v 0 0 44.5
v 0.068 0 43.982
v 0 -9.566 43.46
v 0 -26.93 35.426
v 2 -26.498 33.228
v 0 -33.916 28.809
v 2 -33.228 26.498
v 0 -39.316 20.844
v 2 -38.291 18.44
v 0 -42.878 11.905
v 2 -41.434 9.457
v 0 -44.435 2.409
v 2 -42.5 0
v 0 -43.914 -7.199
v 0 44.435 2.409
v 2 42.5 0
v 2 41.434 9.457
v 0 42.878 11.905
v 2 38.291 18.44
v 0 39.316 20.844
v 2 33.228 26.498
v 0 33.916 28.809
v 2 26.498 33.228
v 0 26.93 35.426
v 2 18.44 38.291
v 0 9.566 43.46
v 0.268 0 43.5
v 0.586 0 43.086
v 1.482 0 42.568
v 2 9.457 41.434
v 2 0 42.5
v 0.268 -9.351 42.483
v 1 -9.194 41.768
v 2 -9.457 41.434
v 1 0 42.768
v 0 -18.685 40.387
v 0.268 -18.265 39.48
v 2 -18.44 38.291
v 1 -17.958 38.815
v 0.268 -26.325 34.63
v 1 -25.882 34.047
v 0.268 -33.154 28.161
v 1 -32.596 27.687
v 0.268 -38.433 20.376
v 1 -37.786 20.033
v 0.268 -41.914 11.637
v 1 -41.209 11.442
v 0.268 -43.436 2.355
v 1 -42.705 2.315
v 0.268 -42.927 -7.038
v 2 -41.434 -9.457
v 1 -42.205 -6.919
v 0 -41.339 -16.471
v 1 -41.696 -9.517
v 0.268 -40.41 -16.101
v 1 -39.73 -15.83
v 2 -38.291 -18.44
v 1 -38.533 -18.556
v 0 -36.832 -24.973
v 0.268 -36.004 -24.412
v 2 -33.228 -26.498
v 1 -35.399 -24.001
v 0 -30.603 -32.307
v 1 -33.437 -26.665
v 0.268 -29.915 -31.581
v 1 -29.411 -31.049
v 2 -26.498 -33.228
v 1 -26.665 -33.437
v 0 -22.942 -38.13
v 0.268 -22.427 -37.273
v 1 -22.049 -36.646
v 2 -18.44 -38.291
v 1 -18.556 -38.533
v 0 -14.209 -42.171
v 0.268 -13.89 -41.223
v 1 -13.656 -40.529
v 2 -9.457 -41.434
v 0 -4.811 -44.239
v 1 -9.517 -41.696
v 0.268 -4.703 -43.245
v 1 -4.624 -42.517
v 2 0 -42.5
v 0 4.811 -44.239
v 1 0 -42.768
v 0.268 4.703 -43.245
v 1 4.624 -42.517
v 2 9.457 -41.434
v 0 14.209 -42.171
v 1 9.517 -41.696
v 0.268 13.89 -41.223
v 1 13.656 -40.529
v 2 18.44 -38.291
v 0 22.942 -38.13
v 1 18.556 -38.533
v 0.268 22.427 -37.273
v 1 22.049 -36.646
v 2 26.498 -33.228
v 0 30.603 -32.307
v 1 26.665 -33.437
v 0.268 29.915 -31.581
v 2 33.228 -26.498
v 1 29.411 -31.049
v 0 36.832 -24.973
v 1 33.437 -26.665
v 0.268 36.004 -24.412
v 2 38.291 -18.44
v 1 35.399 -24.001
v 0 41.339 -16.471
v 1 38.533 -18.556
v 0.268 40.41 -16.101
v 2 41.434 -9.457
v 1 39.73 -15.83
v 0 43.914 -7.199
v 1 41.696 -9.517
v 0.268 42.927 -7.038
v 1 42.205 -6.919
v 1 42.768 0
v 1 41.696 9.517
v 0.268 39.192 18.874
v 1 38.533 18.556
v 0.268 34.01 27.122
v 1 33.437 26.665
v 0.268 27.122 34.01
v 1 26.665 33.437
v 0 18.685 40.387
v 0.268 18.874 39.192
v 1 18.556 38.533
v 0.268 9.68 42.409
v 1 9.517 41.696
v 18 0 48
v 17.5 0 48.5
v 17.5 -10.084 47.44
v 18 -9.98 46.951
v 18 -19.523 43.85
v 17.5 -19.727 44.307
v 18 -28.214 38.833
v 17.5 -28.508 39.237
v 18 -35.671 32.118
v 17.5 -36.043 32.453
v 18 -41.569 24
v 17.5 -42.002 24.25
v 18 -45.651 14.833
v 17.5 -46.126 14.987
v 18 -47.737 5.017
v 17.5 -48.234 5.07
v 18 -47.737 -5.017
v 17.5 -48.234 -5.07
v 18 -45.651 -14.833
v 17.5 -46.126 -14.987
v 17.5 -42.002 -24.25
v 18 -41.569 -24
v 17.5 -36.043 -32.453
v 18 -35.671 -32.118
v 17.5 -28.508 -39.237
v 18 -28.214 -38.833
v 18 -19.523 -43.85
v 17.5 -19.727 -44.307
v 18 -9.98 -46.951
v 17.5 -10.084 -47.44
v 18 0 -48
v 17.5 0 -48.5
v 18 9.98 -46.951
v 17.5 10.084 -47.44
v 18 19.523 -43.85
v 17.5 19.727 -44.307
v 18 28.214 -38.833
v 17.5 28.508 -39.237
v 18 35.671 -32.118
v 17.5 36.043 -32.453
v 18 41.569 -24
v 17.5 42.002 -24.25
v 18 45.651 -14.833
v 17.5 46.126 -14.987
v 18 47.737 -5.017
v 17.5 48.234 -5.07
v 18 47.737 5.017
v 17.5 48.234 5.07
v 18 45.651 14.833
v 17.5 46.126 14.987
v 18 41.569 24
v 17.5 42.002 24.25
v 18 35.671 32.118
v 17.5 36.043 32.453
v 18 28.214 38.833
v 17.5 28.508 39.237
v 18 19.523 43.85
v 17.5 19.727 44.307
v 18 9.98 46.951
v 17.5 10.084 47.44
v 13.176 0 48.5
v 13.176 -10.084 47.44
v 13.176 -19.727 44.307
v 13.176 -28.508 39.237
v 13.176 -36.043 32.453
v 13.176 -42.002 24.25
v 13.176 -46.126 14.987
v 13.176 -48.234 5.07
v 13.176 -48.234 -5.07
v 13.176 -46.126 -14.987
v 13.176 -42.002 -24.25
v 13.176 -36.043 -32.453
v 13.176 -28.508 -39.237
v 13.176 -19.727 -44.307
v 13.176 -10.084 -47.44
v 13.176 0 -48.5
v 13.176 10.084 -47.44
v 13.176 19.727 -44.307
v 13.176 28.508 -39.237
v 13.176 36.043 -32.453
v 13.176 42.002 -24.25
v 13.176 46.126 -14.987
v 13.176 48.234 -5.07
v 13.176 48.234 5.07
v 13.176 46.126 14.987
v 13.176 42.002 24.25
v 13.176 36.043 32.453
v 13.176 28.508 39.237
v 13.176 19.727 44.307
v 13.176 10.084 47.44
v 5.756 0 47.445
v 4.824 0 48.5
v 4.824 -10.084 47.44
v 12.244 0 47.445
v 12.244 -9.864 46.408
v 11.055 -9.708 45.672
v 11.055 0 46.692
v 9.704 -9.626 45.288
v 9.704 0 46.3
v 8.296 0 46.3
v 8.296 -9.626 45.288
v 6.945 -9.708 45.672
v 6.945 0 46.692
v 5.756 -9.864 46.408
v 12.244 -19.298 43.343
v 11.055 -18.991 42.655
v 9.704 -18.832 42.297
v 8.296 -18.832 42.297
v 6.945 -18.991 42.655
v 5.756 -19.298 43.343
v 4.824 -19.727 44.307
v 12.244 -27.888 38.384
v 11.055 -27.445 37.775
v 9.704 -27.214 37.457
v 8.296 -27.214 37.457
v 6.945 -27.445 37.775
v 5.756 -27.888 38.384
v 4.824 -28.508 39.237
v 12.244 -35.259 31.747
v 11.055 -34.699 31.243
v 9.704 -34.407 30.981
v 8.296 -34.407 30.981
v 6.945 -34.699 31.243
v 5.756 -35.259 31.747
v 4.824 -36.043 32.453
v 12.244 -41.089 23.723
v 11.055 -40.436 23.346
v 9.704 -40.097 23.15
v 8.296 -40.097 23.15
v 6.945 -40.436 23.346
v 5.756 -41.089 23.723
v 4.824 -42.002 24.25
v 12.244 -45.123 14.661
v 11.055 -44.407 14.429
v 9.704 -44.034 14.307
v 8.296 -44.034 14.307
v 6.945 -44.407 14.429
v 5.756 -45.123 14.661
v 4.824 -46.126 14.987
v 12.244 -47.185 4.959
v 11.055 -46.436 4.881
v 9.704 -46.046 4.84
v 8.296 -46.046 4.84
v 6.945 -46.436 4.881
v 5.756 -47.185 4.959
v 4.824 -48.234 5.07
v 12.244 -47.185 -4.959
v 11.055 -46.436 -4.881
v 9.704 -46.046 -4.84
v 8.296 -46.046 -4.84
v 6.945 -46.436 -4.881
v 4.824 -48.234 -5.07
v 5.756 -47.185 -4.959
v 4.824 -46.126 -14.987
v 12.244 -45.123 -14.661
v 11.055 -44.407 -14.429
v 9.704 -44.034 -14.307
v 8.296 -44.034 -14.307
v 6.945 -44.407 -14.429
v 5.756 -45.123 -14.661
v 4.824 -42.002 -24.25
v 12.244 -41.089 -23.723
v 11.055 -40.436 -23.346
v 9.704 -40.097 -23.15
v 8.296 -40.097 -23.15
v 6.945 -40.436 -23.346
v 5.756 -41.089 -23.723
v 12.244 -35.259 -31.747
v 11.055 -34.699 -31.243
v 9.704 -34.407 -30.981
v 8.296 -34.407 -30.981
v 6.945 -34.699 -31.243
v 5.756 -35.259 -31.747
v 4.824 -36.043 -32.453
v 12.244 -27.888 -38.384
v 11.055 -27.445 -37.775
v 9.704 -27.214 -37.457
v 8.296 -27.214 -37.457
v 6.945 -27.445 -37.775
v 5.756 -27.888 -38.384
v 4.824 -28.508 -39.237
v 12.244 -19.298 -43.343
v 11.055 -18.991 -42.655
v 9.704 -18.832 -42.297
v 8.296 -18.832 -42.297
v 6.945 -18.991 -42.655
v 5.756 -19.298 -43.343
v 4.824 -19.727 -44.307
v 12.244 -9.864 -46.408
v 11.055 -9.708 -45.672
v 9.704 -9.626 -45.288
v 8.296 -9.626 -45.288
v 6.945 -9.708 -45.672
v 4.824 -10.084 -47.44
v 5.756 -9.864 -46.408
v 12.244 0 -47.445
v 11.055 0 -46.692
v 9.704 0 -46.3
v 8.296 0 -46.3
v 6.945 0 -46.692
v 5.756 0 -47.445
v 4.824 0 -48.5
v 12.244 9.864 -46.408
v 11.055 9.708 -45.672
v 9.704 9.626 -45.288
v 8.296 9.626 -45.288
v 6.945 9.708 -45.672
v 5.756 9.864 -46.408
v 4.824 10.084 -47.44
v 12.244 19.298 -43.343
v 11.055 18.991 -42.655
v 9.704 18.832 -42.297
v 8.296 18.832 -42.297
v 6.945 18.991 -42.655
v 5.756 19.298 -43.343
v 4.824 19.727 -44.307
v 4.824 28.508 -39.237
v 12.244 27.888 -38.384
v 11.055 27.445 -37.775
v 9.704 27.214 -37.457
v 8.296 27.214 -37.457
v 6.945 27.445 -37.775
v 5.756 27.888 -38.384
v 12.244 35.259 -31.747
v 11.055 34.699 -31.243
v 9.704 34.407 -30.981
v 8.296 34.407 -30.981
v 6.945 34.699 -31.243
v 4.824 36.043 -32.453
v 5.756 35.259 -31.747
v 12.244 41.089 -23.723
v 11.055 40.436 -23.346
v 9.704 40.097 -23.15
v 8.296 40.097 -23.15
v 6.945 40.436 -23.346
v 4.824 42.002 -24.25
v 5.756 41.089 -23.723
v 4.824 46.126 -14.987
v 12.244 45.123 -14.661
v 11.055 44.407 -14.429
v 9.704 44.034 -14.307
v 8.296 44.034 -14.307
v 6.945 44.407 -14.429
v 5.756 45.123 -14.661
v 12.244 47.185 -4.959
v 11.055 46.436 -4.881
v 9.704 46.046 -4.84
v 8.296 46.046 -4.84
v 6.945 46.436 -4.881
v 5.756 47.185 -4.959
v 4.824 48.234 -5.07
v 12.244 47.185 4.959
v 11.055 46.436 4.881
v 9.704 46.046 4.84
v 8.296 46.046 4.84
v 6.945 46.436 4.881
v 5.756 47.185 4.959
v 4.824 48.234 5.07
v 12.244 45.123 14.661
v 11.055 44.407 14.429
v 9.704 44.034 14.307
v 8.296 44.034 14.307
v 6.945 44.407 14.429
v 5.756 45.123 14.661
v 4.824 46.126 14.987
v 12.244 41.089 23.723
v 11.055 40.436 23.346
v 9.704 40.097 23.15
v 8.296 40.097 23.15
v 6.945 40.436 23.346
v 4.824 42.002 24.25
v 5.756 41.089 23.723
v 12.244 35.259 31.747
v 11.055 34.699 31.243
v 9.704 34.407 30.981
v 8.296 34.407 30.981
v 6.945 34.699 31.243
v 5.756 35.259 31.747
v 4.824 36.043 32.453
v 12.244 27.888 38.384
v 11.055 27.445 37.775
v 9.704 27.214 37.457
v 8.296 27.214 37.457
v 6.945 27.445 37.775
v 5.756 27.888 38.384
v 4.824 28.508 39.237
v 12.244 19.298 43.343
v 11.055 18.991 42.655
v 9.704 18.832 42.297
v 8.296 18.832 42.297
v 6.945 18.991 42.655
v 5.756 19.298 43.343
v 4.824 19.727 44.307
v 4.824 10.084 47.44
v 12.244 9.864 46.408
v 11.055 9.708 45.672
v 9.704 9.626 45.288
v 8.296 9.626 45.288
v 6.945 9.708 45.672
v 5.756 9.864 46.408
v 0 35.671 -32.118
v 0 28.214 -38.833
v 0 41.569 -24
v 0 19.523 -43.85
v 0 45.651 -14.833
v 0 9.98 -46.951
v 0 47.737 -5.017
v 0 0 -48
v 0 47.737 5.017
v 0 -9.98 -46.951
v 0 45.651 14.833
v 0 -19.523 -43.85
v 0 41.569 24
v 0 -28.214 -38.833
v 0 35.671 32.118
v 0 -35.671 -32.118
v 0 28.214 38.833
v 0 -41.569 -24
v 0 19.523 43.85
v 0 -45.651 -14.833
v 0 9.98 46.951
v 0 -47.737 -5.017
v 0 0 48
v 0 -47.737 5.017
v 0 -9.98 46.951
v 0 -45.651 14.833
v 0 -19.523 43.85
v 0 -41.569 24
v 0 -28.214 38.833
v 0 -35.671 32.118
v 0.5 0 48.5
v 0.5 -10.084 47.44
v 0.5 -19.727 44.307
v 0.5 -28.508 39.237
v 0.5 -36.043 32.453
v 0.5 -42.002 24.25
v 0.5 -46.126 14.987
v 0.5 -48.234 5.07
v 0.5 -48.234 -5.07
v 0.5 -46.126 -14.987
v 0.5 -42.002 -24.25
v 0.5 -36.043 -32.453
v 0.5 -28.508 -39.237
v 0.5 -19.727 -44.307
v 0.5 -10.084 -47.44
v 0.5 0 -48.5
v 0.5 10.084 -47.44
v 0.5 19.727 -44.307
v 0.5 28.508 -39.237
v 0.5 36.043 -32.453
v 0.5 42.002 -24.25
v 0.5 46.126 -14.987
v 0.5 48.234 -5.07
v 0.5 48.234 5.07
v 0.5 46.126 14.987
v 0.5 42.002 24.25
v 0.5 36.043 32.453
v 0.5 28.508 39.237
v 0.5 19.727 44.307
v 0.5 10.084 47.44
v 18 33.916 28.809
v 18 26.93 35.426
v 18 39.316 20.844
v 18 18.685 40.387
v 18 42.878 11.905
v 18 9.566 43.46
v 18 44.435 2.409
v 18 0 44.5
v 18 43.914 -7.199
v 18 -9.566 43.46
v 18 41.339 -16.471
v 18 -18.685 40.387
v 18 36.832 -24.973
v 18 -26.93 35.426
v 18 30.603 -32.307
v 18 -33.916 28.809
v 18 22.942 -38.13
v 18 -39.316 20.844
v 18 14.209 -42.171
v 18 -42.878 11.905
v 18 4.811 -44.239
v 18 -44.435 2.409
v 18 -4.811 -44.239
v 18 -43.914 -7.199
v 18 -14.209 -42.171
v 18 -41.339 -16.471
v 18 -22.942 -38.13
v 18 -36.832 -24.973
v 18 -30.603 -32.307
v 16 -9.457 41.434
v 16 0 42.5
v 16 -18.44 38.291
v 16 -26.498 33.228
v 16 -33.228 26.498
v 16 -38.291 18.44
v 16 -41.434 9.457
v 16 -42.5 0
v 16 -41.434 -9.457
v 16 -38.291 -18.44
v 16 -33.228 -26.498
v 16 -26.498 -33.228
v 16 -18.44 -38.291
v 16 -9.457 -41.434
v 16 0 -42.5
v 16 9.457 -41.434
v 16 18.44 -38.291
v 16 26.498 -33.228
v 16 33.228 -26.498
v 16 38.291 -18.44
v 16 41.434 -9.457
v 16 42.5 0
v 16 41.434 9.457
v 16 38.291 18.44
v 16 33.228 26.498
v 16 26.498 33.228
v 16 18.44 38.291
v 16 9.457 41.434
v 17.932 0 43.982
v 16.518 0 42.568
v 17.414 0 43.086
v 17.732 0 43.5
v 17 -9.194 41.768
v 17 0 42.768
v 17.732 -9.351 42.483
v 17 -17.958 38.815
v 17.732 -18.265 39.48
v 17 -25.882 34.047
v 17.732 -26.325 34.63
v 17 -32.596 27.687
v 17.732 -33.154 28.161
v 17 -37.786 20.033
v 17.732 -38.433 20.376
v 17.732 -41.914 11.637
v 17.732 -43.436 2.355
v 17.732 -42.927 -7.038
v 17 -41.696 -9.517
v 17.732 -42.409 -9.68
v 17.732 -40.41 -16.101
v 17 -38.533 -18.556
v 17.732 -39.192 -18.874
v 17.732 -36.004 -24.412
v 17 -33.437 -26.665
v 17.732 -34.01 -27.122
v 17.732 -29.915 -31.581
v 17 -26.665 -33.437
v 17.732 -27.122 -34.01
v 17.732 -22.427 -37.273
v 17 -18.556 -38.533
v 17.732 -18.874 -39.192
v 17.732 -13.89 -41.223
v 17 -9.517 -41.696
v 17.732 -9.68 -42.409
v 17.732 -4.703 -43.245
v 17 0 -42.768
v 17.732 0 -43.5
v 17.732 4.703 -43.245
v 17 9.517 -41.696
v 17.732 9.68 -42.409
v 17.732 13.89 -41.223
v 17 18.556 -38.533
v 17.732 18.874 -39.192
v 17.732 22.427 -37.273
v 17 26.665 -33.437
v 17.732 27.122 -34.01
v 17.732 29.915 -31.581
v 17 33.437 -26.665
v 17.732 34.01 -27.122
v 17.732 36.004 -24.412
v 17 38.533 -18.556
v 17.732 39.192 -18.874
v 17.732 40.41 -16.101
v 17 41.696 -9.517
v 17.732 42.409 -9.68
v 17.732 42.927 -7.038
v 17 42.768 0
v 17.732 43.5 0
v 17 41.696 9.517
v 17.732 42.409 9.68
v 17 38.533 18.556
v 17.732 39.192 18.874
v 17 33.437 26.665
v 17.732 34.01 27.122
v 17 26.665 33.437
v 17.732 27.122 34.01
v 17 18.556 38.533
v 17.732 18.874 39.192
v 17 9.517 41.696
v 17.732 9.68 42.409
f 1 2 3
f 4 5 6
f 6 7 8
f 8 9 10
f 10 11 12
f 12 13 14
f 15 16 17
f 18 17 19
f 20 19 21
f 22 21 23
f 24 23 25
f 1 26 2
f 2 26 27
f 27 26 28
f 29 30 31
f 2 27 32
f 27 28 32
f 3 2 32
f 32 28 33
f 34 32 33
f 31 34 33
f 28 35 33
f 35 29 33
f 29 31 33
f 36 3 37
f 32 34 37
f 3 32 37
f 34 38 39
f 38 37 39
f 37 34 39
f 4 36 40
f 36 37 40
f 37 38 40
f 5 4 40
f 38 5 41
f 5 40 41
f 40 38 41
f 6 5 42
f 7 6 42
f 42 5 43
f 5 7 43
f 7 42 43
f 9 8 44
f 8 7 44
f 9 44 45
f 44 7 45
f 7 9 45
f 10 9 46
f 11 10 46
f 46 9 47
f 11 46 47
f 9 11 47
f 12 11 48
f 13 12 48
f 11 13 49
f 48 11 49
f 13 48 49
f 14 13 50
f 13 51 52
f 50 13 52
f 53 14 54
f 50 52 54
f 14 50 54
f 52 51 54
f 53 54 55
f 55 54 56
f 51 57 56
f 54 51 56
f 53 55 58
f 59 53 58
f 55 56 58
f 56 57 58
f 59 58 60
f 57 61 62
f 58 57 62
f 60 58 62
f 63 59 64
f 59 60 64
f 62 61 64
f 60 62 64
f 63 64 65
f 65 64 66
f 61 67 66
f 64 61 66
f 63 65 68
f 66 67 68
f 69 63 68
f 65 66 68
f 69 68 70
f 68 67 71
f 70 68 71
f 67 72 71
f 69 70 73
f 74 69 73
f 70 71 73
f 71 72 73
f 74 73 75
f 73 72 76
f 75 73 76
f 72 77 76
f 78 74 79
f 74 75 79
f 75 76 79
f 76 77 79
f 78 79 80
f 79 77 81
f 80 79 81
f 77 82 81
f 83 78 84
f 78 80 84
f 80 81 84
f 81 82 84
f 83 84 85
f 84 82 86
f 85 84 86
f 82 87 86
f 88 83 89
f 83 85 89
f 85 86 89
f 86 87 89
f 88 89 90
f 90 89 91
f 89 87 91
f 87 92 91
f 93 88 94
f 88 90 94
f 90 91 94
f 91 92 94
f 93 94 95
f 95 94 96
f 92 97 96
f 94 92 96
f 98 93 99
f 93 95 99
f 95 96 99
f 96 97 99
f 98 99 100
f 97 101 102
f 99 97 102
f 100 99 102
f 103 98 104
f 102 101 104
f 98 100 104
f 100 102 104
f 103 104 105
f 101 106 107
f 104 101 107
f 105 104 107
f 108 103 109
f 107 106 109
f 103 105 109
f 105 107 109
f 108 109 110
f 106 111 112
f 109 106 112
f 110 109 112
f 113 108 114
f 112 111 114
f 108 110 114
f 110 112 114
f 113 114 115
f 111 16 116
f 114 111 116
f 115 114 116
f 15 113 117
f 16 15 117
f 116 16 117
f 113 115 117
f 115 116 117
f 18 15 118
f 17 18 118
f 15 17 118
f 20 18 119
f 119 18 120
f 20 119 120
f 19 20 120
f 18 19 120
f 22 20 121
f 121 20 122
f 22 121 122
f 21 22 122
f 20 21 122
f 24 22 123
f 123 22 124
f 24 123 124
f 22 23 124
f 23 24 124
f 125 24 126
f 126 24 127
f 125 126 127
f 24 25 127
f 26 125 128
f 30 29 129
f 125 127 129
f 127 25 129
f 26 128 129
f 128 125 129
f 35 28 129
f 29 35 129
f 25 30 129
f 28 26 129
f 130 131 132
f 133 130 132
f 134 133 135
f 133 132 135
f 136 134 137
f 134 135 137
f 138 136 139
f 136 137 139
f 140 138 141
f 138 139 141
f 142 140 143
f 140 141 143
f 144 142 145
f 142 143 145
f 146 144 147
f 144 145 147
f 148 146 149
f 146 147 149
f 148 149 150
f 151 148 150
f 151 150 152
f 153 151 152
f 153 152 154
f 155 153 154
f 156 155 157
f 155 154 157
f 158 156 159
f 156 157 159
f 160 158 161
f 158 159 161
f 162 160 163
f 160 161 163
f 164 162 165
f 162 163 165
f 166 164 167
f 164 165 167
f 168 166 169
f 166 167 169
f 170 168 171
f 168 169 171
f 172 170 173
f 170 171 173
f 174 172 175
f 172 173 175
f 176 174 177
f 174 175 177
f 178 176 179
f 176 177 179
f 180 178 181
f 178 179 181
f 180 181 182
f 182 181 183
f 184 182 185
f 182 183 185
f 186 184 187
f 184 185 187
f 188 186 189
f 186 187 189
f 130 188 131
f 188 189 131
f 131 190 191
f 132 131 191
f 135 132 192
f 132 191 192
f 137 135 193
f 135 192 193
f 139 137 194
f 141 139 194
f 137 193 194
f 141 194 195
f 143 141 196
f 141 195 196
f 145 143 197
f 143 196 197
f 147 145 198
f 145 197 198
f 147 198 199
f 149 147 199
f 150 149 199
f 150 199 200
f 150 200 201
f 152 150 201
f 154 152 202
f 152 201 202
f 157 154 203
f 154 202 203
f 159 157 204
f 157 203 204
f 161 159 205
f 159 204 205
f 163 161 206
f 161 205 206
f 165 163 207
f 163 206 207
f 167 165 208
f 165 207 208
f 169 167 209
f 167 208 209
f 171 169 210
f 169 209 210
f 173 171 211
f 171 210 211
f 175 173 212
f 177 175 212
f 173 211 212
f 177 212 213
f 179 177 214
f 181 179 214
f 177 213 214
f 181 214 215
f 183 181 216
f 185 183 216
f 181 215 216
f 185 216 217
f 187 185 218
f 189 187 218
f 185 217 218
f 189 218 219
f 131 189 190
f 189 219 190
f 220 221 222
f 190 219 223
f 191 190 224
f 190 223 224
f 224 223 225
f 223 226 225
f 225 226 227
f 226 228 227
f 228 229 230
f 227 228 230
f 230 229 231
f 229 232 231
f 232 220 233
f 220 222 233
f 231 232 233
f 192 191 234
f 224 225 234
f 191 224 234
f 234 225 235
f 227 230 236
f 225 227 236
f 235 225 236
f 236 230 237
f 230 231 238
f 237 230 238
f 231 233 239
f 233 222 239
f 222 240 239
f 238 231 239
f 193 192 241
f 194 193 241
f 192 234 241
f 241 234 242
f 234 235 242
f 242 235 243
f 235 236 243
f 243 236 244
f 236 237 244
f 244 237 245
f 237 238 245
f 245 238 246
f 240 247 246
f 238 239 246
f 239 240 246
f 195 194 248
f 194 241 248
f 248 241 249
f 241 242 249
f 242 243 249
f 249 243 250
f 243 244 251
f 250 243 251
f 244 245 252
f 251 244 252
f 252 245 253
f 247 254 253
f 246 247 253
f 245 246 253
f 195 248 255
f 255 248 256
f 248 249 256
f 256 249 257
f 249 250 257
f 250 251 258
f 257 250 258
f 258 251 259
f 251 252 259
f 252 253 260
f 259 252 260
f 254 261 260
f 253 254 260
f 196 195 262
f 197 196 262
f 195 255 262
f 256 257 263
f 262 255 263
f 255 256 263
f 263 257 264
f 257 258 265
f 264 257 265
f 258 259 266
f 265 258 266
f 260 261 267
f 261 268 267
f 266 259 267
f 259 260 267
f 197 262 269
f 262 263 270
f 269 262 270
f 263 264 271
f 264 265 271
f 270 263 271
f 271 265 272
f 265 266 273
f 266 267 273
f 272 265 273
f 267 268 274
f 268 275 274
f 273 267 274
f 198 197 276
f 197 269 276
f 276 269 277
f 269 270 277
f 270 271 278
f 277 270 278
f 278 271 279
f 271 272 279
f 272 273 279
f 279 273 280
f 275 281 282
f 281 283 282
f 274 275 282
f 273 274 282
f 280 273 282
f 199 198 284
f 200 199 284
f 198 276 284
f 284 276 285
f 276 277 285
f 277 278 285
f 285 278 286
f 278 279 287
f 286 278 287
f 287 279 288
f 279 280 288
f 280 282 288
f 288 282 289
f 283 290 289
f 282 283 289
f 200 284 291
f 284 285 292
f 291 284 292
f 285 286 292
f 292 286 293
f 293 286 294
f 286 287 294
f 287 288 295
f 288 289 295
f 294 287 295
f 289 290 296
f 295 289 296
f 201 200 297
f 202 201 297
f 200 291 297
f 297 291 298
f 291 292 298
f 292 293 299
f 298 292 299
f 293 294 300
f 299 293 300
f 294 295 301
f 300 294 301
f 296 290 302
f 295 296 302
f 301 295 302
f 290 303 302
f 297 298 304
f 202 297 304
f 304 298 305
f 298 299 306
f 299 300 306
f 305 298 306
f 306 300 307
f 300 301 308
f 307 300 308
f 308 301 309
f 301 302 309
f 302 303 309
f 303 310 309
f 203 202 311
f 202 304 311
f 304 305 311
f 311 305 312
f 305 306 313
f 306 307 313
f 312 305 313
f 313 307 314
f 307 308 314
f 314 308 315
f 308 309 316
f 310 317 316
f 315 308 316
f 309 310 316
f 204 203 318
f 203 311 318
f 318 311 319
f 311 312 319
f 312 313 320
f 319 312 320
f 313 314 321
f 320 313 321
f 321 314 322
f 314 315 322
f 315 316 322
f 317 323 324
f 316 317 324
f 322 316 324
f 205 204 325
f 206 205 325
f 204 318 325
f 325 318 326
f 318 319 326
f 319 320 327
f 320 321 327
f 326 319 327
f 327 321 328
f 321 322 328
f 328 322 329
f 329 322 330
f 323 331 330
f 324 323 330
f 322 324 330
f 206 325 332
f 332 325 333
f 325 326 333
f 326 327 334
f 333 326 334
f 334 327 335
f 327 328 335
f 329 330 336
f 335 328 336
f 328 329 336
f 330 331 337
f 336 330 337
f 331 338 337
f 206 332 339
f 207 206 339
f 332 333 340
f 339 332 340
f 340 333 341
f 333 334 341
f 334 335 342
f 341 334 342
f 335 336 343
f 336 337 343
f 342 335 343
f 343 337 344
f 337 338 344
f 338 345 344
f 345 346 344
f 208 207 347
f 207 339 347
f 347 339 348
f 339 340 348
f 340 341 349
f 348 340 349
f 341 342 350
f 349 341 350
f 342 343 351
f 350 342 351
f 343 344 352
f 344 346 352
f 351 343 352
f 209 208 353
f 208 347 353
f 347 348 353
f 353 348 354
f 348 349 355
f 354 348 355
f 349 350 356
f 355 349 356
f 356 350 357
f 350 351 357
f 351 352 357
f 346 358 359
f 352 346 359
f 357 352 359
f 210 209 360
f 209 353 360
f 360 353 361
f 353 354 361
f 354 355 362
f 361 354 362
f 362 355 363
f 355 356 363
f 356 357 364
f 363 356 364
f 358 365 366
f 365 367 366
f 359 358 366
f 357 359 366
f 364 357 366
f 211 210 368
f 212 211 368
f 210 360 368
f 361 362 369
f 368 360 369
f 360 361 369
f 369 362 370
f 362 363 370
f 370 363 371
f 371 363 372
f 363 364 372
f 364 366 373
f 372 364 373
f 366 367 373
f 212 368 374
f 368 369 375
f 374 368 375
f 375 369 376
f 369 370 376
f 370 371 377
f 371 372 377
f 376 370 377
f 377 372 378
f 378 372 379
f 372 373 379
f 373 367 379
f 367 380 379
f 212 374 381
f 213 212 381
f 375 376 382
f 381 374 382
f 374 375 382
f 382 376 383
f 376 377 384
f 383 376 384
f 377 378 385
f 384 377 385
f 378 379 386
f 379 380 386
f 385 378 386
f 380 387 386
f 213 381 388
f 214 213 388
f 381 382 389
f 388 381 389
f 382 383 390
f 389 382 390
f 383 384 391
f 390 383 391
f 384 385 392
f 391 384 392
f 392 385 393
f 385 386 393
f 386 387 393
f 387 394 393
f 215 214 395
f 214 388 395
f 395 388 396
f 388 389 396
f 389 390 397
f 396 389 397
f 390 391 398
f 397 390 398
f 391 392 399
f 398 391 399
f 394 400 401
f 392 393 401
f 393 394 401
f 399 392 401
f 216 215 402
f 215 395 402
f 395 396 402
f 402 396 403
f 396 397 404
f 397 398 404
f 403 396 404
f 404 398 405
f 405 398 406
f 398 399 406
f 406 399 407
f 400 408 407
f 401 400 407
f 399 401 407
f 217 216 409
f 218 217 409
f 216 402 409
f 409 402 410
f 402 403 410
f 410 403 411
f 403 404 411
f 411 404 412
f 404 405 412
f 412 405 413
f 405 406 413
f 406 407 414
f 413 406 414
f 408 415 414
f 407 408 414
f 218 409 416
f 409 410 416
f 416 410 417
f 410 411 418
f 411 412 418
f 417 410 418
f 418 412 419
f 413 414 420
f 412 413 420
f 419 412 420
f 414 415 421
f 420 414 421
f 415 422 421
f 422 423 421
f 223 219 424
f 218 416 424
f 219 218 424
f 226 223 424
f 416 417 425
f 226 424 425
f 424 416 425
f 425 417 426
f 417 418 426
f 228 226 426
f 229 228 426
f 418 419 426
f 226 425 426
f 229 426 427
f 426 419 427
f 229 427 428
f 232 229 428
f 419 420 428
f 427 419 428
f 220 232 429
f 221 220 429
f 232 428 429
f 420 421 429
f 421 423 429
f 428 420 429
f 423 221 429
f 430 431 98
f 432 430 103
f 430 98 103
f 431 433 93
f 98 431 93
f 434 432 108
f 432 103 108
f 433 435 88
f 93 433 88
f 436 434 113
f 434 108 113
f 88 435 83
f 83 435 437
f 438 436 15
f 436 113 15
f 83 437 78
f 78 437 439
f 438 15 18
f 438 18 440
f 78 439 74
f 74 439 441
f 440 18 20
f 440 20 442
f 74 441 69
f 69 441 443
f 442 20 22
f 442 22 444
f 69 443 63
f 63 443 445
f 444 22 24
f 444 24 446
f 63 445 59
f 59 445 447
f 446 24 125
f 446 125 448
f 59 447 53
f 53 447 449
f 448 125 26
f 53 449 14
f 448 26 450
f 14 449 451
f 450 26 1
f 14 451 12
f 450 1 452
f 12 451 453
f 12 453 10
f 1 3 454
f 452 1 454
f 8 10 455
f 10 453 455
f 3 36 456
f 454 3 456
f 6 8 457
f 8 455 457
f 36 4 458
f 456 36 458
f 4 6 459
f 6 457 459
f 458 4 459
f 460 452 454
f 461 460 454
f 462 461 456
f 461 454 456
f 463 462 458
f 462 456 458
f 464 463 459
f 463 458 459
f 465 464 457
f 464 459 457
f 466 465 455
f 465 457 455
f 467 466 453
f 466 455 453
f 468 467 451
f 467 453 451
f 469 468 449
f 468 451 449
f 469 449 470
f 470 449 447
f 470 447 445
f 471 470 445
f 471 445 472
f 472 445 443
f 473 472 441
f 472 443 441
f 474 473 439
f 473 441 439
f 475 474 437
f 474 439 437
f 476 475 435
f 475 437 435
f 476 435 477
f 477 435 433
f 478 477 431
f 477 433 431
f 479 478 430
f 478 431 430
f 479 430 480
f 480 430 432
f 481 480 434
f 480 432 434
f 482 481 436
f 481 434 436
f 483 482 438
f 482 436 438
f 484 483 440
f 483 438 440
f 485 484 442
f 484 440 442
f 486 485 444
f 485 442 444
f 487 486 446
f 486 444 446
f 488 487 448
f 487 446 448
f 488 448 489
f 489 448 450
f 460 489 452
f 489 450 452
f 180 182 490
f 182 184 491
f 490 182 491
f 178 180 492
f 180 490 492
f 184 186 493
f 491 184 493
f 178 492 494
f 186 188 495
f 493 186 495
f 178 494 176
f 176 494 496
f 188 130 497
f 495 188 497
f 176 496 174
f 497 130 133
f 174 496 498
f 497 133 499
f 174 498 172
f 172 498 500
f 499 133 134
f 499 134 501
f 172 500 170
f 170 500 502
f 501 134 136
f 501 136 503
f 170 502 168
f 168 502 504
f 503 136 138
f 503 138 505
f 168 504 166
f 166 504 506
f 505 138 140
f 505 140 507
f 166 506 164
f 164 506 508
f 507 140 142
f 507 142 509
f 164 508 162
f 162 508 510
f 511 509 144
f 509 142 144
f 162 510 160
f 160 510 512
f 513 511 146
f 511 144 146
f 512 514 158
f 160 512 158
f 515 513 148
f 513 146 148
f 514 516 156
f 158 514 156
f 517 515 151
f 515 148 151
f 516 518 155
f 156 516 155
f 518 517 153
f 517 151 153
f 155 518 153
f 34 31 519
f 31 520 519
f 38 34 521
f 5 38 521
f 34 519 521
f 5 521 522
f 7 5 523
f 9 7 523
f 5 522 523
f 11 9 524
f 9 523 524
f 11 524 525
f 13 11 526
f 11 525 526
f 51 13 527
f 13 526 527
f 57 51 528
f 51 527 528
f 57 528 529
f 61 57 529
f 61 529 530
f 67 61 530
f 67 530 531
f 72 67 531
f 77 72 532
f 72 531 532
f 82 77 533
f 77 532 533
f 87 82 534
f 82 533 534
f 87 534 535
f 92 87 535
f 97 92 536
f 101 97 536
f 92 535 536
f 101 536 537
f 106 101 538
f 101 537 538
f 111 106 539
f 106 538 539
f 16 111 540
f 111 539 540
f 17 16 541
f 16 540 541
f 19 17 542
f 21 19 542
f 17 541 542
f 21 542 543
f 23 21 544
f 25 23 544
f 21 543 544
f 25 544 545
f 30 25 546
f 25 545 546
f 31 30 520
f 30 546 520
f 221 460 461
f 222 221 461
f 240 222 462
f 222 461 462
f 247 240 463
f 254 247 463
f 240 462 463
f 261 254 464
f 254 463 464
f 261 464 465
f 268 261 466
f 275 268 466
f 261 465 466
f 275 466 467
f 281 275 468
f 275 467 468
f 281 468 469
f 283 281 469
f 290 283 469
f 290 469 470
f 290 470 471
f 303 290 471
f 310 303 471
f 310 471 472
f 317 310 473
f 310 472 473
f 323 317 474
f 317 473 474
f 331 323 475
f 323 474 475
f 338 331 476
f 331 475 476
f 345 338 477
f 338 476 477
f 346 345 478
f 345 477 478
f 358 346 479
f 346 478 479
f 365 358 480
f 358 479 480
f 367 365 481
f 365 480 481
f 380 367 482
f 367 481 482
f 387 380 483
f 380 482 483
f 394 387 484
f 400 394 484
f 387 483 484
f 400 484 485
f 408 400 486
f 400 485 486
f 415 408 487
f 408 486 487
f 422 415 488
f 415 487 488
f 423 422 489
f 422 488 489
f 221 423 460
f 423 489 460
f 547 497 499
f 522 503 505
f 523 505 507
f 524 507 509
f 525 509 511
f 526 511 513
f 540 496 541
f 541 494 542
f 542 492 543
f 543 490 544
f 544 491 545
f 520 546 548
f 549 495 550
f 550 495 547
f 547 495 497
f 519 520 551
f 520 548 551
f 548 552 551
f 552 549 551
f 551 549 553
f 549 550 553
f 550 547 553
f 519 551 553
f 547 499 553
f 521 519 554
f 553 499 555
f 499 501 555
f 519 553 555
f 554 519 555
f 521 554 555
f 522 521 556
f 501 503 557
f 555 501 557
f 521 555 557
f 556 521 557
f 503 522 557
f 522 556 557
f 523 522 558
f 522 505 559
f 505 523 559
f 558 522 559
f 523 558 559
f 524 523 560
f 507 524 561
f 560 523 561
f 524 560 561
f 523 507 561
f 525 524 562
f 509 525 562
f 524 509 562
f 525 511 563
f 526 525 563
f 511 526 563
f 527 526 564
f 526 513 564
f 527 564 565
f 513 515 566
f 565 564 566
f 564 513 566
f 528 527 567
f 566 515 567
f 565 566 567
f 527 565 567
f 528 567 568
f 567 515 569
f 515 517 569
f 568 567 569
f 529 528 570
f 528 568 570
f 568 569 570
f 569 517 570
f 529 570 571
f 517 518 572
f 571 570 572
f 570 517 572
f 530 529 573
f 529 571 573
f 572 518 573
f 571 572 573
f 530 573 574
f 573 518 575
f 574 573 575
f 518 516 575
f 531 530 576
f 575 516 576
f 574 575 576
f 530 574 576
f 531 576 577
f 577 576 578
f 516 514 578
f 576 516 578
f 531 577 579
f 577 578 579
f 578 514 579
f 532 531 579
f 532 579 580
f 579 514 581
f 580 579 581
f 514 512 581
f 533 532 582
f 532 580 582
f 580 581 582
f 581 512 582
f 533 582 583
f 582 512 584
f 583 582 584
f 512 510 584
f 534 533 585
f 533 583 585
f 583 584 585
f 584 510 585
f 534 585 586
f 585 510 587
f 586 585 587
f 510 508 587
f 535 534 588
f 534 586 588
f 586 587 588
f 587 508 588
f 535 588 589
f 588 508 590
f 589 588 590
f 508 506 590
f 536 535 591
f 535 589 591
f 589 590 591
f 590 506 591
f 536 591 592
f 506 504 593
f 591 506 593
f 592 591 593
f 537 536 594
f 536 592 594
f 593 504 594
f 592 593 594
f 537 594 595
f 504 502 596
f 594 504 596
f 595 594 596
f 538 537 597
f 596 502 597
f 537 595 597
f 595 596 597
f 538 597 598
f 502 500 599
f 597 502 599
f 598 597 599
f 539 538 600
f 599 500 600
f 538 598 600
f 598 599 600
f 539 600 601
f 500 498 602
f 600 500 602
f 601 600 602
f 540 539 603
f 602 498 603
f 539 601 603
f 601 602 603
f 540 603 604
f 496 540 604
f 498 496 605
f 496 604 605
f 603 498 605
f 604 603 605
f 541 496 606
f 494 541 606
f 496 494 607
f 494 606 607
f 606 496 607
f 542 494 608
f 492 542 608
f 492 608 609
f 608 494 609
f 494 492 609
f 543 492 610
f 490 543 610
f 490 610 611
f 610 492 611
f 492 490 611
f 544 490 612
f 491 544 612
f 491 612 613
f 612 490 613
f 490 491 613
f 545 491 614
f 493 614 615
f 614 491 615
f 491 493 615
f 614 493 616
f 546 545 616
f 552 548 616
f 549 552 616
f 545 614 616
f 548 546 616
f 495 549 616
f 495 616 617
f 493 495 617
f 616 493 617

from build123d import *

# Parameters (mm, degrees)
CHANFREIN2_SIZE = 0.5


with BuildPart() as part:
    # Esquisse1 → Base-Révolution (revolve)
    with BuildSketch(Plane.XY, mode=Mode.PRIVATE) as base_r_volution_sk:
        with BuildLine():
            Line((2, 42.5), (16, 42.5))
            ThreePointArc((16, 42.5), (17.414213562, 43.085786438), (18, 44.5))
            Line((18, 44.5), (18, 48.5))
            Line((18, 48.5), (13.175823272, 48.5))
            ThreePointArc((13.175823272, 48.5), (9, 46.25), (4.824176728, 48.5))
            Line((4.824176728, 48.5), (0, 48.5))
            Line((0, 48.5), (0, 44.5))
            ThreePointArc((0, 44.5), (0.585786438, 43.085786438), (2, 42.5))
        make_face()
    revolve(base_r_volution_sk.sketch.rotate(Axis((0, 0, 0), (1, 0, 0)), 90), axis=Axis((0, 0, 0), (1, 0, 0)))

    # Chanfrein2
    chanfrein2_edges = [part.edges().sort_by_distance(p)[0] for p in [
        (18, 0, -48.5),
        (0, 0, -48.5),
    ]]
    chamfer(chanfrein2_edges, length=CHANFREIN2_SIZE)


solid = part.part
